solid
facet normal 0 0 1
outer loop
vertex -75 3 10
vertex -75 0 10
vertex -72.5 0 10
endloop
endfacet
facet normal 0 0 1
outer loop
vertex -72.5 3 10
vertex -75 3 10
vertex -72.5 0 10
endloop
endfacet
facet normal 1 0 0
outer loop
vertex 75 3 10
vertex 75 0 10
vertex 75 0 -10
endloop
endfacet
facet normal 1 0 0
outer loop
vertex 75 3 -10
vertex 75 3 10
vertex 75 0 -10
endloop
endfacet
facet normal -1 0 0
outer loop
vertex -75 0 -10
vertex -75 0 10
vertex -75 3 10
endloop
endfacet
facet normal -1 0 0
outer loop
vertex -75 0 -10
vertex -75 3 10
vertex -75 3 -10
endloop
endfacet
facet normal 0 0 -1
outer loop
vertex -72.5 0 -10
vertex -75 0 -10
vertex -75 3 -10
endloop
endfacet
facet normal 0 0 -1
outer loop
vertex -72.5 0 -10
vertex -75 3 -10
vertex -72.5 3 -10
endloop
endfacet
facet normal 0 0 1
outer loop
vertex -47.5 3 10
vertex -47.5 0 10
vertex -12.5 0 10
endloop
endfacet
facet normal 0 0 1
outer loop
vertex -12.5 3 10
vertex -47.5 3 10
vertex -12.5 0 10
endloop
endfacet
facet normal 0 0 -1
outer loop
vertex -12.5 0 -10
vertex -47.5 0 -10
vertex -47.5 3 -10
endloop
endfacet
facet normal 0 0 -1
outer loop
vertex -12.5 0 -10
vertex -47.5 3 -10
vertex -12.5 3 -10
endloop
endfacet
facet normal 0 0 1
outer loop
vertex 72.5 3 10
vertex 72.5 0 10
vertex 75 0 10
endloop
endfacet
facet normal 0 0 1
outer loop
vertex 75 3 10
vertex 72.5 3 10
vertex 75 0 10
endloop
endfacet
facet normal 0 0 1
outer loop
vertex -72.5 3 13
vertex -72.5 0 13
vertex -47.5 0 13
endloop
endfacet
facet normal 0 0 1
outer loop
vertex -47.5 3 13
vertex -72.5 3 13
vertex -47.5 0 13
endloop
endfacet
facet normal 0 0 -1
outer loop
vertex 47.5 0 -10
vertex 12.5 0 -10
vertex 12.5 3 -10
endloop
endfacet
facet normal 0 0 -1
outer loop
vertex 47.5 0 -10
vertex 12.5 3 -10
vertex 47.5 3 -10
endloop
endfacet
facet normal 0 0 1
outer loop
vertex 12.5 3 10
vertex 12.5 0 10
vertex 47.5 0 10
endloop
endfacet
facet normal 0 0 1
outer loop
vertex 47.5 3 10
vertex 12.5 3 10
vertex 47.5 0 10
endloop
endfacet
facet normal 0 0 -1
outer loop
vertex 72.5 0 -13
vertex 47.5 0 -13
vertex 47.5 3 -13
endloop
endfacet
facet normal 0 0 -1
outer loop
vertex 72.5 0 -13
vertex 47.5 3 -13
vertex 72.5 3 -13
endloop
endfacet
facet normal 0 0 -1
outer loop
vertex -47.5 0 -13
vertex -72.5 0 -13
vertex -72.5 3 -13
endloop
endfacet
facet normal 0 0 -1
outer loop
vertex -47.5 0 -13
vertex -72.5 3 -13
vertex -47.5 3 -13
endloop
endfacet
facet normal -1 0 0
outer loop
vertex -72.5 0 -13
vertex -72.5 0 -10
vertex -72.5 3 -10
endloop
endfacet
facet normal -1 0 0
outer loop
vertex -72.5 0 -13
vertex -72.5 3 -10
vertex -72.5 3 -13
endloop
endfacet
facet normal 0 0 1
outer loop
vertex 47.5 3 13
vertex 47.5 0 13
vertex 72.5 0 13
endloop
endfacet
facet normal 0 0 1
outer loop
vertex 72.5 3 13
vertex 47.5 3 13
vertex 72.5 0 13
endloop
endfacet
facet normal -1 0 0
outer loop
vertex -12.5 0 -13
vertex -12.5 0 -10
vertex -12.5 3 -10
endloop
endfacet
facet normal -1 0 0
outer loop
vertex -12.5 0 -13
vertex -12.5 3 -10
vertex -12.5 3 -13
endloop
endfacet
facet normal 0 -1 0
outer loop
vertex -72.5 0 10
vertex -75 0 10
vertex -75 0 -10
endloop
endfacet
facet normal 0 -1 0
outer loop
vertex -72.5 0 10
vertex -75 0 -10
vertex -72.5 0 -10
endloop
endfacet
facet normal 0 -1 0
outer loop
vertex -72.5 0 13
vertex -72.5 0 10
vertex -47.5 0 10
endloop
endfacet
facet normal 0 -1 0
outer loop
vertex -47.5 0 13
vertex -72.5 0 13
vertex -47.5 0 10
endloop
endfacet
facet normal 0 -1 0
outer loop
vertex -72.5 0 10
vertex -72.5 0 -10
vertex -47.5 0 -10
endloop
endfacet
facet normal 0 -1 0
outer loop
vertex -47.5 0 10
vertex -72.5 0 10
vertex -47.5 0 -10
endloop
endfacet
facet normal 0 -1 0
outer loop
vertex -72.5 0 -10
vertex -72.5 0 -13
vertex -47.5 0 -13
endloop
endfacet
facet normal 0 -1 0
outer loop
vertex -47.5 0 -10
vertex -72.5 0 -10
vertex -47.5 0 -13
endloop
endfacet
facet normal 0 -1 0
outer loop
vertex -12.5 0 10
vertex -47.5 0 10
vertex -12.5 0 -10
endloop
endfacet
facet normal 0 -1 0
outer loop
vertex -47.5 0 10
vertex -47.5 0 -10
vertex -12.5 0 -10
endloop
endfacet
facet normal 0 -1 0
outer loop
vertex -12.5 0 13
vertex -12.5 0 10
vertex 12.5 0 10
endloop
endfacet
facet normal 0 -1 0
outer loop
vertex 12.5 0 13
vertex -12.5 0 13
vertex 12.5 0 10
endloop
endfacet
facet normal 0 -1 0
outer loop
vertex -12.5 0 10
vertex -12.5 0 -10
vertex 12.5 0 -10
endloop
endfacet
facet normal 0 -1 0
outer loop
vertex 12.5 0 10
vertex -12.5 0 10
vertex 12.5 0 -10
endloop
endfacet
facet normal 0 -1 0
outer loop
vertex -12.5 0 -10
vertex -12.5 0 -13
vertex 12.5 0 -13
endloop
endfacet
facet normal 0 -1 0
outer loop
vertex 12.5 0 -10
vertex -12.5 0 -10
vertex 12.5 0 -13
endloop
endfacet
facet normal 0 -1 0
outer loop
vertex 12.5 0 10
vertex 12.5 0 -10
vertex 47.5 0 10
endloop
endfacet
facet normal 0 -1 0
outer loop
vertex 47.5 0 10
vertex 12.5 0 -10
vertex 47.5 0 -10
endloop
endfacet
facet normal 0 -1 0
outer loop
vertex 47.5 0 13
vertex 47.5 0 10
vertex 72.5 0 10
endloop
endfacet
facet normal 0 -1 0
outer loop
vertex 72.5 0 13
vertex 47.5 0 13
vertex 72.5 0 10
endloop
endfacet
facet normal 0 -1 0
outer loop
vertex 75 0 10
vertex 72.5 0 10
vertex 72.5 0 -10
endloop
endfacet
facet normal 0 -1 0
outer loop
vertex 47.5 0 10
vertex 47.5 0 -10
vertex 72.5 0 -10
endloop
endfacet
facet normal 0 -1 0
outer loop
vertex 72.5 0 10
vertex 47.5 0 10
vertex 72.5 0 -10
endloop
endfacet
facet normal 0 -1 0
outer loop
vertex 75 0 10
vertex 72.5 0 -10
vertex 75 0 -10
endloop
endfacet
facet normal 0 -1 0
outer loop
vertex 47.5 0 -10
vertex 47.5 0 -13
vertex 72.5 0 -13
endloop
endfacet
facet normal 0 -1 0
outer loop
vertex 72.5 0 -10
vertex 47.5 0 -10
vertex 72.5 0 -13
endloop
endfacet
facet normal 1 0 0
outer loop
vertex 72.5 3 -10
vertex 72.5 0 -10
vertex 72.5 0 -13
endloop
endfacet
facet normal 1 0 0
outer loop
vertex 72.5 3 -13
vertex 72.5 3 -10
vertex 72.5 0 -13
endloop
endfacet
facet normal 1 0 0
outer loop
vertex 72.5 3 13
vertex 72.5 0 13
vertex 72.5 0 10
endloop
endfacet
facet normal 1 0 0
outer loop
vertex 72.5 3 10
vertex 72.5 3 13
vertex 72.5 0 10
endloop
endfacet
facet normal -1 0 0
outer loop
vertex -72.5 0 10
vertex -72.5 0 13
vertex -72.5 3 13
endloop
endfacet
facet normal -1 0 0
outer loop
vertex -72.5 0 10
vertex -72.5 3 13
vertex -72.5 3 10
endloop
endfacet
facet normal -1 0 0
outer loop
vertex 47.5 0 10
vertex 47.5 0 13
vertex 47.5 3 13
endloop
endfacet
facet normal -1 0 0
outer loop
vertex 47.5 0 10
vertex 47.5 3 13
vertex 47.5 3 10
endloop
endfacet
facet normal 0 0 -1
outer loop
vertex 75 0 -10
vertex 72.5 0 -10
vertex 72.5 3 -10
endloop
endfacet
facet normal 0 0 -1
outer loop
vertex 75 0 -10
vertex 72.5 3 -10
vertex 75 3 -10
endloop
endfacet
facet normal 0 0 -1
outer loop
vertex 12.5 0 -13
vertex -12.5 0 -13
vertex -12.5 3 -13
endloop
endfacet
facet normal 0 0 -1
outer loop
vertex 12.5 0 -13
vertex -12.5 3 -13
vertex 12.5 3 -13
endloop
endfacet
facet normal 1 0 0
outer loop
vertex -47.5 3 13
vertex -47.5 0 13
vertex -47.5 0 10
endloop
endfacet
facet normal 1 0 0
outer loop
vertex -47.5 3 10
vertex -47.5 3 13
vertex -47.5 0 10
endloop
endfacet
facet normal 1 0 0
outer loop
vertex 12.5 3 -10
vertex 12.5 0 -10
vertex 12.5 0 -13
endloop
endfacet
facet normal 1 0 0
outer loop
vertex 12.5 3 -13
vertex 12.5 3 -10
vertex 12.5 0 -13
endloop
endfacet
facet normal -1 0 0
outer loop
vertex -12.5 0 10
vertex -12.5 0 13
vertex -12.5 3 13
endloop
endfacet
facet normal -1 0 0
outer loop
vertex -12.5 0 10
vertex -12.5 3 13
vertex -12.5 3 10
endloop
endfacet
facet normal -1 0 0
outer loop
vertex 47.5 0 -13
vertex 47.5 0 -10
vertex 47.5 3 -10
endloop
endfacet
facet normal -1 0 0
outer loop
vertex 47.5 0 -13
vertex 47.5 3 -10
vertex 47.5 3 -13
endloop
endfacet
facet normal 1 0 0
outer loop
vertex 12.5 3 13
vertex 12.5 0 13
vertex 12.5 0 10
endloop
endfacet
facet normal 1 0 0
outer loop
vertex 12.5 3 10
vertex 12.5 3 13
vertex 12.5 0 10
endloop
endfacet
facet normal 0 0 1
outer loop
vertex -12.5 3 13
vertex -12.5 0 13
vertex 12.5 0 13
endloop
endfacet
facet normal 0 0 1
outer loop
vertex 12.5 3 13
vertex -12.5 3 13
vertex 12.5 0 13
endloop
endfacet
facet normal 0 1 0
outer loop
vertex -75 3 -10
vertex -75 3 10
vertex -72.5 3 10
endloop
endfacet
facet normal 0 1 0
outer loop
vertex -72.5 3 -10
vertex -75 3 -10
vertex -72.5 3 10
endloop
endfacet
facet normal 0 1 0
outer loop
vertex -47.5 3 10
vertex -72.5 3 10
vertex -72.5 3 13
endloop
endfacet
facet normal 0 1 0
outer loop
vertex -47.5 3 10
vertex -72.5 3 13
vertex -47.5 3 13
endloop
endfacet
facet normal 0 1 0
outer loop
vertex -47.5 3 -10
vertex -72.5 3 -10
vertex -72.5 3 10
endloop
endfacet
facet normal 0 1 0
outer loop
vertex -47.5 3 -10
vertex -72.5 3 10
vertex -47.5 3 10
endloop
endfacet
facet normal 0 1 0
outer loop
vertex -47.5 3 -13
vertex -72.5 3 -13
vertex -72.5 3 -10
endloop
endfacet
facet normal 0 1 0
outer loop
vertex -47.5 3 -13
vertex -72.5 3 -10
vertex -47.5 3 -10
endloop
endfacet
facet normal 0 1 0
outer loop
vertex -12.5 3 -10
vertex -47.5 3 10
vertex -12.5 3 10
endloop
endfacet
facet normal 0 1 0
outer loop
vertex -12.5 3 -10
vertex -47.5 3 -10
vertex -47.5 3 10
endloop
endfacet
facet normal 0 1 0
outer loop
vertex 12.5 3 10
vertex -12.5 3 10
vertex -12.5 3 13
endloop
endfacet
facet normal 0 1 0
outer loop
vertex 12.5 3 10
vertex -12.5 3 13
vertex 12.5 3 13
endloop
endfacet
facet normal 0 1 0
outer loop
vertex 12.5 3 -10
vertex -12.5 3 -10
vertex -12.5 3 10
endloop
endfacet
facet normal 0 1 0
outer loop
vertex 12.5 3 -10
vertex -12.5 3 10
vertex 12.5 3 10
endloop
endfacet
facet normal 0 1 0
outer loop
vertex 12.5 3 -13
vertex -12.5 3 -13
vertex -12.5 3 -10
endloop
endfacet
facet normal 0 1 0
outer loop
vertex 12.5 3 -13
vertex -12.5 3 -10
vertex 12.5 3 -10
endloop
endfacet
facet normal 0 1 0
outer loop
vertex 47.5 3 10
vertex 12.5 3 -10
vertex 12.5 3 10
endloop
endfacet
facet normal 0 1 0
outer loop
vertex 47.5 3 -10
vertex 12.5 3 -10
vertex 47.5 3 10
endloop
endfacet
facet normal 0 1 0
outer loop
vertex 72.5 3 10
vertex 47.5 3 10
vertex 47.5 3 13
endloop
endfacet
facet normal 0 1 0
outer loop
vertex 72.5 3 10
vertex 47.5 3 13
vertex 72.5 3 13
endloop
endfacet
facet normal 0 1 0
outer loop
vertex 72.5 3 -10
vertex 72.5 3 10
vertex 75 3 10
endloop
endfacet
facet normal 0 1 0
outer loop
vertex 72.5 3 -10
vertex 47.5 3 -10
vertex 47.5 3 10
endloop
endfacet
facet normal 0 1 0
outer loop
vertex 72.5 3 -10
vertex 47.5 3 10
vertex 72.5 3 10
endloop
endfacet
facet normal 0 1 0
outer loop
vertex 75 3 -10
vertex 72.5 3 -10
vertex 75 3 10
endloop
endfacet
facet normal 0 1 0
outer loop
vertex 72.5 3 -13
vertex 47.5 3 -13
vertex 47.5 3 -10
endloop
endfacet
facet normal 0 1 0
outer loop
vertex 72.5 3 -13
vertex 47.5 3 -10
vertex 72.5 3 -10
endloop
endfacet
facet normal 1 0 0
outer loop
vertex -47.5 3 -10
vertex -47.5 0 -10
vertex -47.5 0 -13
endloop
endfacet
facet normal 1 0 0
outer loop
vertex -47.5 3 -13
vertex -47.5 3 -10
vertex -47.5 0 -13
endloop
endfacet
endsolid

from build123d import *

# Parameters (mm, degrees)
SKETCH_1_W      = 150
SKETCH_1_H      = 20
SKETCH_1_W_2    = 25
SKETCH_1_H_2    = 3
EXTRUDE_1_DEPTH = 3


with BuildPart() as part:
    # 草图1 → 凸台-拉伸1 (new body)
    with BuildSketch(Plane(origin=(0, 0, 0), x_dir=(1, 0, 0), z_dir=(0, 1, 0))):
        Rectangle(SKETCH_1_W, SKETCH_1_H)
        with Locations((-60, 11.5)):
            Rectangle(SKETCH_1_W_2, SKETCH_1_H_2)
        with Locations((-60, -11.5)):
            Rectangle(SKETCH_1_W_2, SKETCH_1_H_2)
        with Locations((0, -11.5)):
            Rectangle(SKETCH_1_W_2, SKETCH_1_H_2)
        with Locations((0, 11.5)):
            Rectangle(SKETCH_1_W_2, SKETCH_1_H_2)
        with Locations((60, 11.5)):
            Rectangle(SKETCH_1_W_2, SKETCH_1_H_2)
        with Locations((60, -11.5)):
            Rectangle(SKETCH_1_W_2, SKETCH_1_H_2)
    extrude(amount=EXTRUDE_1_DEPTH)


solid = part.part
